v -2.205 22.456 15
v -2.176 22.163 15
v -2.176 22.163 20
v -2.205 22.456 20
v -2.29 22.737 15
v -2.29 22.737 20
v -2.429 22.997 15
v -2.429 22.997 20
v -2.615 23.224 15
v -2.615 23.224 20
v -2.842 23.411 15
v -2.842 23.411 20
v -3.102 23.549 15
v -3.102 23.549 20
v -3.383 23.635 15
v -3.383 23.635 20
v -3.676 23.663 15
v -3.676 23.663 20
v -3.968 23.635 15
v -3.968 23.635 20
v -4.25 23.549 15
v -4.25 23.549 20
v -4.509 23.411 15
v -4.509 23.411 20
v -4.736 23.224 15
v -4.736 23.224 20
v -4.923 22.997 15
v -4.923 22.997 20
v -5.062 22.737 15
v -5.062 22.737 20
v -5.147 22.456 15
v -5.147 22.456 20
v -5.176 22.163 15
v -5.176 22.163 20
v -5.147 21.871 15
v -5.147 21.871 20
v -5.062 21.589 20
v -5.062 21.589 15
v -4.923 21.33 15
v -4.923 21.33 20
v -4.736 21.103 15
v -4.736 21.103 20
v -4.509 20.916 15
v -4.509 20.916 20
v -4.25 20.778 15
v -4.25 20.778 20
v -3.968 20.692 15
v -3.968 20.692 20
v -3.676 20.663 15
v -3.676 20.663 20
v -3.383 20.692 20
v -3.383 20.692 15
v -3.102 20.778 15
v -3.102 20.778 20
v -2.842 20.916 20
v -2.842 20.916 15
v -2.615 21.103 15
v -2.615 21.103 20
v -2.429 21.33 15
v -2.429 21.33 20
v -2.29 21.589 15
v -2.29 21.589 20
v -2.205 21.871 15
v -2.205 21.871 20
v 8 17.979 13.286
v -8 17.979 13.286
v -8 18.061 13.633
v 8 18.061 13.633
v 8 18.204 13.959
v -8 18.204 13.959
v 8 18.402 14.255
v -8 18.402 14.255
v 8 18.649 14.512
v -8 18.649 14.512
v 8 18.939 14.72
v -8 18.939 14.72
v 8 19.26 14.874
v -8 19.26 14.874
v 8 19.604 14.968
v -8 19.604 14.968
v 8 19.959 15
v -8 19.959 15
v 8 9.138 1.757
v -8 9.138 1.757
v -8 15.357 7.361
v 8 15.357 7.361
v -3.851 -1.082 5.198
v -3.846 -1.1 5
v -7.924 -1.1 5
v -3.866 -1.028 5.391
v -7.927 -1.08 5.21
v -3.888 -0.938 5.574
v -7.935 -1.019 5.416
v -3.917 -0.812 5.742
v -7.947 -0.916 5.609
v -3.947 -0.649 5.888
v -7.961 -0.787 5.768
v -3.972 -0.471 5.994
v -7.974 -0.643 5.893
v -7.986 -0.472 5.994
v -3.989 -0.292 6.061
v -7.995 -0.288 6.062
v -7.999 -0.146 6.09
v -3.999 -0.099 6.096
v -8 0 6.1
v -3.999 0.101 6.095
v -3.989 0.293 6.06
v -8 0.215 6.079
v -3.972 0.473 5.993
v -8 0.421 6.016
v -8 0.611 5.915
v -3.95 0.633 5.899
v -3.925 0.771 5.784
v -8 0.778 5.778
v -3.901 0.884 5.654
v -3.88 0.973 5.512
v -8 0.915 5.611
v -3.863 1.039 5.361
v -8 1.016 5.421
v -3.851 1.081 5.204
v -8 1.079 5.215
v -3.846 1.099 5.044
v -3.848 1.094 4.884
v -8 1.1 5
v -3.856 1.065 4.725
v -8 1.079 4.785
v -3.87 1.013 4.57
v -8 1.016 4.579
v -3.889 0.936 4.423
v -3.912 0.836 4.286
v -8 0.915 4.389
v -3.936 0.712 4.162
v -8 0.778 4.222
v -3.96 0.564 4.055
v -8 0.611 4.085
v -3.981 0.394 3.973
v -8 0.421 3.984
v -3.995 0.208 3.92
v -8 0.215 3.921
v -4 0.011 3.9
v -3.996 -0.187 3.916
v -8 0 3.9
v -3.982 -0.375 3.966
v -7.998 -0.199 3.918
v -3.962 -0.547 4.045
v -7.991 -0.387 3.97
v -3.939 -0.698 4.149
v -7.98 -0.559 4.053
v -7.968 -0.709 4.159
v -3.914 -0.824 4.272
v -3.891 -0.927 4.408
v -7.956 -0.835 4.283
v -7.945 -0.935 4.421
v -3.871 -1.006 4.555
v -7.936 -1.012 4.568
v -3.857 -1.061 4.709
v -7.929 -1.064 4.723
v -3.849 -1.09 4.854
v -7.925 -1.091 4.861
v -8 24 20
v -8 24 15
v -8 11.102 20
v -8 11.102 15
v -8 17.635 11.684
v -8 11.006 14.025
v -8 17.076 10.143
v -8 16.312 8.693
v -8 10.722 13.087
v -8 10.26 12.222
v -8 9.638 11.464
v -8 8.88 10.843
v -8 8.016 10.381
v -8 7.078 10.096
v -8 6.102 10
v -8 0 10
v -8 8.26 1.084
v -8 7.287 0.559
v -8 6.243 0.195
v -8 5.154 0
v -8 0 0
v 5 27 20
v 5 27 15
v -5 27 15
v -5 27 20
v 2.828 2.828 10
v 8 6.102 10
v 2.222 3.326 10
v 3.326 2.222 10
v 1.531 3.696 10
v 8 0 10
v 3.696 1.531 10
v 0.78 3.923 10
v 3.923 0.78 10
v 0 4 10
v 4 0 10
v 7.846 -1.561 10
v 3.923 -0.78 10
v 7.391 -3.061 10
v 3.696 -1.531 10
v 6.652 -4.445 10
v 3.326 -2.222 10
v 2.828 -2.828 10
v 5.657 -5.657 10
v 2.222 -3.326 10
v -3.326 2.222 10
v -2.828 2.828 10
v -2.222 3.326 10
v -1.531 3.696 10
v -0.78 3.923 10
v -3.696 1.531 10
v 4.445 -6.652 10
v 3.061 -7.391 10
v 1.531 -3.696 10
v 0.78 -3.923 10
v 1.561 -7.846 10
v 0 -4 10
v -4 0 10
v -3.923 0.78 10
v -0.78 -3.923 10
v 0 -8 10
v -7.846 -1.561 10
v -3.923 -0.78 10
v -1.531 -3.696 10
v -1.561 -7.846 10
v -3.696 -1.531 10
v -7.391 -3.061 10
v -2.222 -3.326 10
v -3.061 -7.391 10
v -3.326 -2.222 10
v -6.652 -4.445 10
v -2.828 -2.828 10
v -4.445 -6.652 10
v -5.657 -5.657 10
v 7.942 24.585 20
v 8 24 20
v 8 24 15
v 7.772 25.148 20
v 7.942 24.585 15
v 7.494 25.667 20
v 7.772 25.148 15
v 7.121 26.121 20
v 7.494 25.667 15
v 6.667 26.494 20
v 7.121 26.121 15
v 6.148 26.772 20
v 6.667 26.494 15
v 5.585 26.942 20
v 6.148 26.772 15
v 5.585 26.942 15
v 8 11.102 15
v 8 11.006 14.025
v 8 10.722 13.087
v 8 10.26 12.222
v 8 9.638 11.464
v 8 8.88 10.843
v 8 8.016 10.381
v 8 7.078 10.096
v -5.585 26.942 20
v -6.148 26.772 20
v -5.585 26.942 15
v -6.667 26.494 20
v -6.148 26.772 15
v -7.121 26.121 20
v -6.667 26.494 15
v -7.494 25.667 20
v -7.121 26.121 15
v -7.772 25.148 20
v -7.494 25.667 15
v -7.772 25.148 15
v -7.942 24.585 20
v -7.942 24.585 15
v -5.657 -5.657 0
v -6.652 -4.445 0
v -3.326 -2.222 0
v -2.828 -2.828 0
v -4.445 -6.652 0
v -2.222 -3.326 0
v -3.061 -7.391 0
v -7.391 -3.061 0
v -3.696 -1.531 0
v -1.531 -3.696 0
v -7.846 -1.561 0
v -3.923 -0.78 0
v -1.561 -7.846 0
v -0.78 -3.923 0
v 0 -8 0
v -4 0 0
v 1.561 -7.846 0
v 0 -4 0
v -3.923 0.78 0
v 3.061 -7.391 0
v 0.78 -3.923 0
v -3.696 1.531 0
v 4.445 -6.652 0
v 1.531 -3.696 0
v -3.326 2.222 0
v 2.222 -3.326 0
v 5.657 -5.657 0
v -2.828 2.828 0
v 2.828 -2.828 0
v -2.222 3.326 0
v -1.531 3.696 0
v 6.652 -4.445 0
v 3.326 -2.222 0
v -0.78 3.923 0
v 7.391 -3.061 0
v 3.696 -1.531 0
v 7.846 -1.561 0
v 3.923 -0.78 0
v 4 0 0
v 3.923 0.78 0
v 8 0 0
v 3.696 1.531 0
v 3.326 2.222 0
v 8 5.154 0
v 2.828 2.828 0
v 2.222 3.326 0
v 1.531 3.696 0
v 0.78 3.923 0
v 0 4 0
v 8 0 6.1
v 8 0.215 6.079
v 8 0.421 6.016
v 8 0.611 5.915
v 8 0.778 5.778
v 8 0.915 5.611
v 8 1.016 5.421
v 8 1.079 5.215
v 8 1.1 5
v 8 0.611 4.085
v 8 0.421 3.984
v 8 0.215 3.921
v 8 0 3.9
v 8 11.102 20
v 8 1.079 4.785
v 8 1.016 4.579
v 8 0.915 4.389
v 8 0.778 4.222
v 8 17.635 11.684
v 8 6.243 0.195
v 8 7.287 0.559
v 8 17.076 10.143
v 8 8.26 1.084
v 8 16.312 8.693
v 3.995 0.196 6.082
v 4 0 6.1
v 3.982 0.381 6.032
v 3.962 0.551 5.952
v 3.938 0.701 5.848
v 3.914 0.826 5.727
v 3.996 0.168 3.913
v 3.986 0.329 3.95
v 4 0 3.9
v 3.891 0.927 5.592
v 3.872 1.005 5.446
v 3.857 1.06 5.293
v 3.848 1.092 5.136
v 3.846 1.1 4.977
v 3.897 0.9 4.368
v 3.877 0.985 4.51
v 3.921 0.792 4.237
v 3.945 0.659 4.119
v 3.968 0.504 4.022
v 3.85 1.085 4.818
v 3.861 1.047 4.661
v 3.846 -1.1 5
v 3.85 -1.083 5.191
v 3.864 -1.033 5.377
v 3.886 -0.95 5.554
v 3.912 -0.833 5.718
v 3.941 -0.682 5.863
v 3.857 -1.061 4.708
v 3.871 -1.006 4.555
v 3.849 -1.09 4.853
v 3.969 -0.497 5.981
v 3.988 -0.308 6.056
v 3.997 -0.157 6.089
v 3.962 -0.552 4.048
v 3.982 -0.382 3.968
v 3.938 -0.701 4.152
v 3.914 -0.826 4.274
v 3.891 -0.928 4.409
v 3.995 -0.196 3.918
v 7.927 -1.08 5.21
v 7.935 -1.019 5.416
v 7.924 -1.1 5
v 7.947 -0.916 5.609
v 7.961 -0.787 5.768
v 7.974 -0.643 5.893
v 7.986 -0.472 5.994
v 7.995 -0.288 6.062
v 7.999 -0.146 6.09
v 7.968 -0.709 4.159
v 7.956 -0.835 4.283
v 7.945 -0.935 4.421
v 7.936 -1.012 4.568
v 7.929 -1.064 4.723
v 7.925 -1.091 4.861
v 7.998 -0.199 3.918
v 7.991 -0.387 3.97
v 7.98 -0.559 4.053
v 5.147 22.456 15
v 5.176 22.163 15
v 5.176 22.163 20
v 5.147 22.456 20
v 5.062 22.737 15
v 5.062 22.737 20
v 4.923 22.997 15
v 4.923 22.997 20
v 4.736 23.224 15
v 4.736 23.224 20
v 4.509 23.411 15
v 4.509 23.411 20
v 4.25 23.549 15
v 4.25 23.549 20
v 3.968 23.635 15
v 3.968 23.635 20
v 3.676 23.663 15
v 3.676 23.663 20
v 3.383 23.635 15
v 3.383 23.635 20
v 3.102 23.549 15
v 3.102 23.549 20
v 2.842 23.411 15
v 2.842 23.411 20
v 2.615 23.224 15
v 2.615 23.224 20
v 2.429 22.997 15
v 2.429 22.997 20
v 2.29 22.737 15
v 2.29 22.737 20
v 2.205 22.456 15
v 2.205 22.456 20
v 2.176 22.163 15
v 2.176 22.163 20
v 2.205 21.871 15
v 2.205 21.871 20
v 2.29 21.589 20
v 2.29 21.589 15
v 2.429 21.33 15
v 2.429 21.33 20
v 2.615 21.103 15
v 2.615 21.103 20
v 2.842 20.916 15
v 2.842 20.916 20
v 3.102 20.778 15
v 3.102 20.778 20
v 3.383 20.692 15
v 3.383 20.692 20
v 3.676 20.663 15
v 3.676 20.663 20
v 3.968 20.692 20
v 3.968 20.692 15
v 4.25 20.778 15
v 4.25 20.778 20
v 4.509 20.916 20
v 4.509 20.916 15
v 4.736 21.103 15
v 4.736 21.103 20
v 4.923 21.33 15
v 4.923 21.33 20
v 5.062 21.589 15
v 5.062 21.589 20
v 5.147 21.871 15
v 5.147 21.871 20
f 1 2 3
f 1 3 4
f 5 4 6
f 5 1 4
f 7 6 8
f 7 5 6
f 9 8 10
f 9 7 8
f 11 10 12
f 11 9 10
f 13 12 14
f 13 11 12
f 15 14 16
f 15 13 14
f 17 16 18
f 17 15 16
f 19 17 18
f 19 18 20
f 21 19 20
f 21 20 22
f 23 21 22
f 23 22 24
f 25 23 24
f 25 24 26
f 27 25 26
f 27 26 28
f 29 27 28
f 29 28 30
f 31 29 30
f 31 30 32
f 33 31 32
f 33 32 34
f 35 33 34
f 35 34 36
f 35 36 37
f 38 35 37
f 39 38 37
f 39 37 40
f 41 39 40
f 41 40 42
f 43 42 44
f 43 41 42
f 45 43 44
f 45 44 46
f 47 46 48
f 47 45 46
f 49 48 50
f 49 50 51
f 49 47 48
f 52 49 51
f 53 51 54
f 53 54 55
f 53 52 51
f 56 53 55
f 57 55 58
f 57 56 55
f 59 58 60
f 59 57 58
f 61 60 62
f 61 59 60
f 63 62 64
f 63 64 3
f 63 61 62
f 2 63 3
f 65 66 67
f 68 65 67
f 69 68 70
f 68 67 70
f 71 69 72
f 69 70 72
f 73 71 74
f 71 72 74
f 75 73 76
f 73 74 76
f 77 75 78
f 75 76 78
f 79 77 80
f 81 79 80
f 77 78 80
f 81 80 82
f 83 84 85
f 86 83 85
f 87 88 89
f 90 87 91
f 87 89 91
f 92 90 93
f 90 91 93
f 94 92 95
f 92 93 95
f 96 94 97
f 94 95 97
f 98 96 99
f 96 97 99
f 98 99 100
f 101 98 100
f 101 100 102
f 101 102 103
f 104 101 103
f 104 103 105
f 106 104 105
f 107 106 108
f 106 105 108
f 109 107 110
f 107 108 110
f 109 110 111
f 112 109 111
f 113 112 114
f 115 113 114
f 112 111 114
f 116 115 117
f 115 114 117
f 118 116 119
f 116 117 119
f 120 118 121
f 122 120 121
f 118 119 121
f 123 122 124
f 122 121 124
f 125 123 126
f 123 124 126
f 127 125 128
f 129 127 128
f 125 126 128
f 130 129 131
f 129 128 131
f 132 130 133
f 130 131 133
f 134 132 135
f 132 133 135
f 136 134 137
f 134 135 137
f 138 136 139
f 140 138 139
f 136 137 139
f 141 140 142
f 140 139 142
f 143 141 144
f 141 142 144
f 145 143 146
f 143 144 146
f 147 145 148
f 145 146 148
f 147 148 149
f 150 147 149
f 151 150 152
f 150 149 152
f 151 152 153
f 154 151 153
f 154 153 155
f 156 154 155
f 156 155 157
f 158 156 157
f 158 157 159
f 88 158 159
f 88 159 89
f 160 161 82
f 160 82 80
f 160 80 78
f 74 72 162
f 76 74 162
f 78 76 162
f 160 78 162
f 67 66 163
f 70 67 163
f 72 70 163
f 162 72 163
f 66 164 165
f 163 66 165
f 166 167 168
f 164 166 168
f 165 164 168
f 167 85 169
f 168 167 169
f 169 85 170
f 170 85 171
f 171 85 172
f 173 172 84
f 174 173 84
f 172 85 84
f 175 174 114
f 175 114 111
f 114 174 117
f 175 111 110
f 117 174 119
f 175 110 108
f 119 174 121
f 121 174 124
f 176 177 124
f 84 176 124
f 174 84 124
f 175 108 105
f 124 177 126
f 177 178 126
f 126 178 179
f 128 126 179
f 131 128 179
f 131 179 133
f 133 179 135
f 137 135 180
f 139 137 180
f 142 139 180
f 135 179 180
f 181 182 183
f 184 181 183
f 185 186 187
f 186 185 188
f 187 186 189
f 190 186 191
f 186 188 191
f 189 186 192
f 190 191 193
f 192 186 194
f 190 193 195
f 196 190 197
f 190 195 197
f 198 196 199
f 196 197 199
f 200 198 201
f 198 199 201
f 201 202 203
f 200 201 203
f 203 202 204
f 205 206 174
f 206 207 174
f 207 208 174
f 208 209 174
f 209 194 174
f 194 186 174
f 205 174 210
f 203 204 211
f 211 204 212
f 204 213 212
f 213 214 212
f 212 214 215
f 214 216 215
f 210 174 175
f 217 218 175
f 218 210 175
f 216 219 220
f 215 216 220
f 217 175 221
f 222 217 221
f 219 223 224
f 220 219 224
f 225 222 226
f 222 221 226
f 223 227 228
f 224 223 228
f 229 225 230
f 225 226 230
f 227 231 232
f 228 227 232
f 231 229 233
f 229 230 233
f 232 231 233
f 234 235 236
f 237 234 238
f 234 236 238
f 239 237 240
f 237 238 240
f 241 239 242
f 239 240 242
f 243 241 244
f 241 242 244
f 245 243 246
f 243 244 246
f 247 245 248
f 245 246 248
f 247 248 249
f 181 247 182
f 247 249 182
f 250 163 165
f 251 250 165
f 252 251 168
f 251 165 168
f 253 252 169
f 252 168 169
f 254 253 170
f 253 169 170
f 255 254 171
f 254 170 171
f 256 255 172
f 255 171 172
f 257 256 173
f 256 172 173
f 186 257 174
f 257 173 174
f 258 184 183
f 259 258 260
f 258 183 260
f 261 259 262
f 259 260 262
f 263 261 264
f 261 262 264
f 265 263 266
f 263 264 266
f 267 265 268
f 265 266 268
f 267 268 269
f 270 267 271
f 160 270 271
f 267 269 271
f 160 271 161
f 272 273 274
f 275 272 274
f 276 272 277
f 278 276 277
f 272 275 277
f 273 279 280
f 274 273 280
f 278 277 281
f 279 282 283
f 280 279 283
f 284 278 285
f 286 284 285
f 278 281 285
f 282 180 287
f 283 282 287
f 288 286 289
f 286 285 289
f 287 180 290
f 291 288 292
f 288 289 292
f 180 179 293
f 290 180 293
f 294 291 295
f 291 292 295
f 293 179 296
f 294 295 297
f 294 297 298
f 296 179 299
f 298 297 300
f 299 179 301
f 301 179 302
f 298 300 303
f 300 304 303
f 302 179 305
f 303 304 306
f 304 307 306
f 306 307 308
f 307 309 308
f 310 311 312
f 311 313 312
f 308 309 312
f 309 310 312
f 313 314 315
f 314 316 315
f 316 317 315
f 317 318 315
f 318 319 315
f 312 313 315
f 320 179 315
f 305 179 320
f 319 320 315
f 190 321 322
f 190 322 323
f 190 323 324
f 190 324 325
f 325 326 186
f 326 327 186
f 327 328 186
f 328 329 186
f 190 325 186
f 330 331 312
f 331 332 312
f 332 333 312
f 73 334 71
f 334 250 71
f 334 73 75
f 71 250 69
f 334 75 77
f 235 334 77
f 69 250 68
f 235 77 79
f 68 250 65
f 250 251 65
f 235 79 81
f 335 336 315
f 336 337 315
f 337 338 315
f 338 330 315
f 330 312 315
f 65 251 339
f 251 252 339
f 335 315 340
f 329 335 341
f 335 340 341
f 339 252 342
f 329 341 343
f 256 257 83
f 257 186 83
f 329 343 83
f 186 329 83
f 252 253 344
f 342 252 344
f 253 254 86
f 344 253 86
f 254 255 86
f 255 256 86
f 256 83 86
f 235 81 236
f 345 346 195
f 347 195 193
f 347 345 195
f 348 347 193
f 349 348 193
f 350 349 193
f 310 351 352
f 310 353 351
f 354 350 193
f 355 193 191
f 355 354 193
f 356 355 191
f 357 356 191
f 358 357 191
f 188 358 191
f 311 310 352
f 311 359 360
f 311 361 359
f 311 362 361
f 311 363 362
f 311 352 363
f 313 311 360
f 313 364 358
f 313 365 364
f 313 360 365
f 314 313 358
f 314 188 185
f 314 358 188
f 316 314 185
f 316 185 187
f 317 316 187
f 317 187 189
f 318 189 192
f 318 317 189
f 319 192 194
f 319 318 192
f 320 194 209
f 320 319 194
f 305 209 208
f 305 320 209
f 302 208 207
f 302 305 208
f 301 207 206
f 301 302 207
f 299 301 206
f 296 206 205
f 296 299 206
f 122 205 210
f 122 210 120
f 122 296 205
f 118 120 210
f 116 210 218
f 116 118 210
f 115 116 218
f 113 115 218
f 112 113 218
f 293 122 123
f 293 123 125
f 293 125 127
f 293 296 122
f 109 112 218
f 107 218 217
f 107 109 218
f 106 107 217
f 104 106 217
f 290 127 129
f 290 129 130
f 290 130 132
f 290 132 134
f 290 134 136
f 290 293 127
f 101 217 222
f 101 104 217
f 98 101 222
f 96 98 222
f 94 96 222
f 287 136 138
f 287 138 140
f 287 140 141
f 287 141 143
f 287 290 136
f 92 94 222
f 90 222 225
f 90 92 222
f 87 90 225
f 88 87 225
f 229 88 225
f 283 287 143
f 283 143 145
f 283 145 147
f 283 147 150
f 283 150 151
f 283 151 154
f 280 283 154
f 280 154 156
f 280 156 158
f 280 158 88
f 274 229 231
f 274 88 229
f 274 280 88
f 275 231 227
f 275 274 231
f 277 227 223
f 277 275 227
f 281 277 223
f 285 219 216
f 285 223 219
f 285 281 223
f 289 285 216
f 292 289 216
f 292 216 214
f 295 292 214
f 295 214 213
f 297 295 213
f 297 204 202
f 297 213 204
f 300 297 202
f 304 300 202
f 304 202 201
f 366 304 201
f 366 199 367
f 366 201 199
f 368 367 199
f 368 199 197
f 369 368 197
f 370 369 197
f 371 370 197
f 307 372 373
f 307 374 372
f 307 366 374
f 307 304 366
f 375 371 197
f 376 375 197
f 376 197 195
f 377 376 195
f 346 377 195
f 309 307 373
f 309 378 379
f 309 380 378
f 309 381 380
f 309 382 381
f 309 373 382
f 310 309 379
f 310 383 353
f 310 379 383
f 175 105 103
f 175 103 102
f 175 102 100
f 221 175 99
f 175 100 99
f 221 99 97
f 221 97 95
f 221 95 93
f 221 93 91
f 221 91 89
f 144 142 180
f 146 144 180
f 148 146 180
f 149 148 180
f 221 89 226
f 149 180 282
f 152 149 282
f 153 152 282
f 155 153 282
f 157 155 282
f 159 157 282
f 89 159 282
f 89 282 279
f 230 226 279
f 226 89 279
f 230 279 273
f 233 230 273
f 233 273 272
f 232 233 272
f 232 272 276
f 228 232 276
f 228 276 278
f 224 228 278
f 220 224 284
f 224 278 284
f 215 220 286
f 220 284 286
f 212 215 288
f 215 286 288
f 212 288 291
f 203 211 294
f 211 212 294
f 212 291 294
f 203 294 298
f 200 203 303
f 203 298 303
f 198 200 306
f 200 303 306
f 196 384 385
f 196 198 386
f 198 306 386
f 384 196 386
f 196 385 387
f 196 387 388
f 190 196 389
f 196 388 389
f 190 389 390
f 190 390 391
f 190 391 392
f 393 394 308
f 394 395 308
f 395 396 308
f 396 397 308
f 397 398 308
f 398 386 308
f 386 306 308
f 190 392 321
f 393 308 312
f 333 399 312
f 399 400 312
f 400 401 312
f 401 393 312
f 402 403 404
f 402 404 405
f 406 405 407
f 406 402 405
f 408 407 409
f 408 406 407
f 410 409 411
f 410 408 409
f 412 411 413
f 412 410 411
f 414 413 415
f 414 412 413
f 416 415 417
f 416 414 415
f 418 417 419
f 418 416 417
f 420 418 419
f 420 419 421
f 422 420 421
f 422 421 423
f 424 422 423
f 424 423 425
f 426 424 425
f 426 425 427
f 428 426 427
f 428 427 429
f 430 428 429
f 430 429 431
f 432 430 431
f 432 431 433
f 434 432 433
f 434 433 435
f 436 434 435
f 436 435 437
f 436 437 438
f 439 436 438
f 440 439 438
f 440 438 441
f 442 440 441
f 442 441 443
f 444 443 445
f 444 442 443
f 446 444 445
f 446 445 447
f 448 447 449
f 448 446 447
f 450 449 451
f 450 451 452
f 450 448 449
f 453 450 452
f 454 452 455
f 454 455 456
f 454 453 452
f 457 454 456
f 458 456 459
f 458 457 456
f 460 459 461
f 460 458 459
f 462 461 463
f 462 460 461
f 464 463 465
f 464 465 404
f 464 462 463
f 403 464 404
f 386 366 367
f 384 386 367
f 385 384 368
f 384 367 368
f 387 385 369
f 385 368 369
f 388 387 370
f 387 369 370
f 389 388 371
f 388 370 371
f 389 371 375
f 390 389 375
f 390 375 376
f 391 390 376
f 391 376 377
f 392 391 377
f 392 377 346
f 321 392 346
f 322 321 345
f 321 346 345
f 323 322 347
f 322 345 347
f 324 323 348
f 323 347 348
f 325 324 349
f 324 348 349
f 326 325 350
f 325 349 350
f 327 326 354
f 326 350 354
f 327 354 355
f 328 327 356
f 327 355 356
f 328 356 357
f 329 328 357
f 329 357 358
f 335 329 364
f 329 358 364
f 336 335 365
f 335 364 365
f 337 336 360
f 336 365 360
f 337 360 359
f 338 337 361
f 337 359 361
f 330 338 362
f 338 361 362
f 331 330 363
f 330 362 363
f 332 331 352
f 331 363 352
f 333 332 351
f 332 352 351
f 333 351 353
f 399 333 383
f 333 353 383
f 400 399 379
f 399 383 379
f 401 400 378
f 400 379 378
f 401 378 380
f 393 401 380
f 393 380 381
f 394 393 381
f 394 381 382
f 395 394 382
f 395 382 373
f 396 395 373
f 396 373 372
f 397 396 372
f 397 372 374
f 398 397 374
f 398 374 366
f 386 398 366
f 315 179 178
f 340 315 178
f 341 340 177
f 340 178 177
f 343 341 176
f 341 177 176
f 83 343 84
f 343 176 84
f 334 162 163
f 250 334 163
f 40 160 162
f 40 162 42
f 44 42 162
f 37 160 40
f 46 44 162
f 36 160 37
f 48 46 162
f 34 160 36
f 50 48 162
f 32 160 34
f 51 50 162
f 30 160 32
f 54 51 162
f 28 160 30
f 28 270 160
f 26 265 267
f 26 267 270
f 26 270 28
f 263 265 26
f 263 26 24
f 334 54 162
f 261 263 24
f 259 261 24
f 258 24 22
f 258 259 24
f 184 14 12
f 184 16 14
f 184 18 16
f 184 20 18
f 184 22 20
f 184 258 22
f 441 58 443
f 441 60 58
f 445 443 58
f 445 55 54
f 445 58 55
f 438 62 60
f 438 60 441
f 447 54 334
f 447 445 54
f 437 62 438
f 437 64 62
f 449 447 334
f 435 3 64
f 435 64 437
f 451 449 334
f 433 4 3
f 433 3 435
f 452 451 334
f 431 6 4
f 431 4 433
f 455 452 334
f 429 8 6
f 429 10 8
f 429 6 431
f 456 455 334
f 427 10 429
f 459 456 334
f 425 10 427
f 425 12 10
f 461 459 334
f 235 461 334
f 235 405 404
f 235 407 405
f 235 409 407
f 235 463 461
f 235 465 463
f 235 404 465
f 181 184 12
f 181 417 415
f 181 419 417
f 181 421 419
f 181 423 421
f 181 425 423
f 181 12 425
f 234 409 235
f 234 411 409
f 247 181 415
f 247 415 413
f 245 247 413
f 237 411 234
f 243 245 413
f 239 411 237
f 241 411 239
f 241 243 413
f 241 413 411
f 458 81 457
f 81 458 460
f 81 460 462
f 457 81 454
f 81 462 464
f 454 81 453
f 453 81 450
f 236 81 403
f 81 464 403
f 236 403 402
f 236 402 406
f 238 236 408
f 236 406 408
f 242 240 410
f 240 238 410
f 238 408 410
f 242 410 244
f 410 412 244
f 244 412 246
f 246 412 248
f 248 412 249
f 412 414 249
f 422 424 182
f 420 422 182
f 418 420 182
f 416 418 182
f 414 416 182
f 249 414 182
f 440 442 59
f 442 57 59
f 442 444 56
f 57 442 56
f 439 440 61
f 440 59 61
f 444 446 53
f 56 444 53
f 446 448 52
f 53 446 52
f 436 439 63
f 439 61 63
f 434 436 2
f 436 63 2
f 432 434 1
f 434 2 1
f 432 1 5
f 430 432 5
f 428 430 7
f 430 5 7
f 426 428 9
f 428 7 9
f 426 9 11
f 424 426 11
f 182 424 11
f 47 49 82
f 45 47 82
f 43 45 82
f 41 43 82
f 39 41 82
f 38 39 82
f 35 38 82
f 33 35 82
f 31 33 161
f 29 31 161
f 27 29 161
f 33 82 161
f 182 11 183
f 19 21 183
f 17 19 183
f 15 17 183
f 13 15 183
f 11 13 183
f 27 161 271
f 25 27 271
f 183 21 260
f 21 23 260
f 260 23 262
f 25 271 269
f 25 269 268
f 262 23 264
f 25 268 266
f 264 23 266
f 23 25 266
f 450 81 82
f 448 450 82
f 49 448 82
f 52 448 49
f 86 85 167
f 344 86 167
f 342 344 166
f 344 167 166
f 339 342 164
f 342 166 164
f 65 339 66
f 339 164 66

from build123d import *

# Parameters (mm, degrees)
F0_R     = 4
F0_R_2   = 1.5
F1_DEPTH = 20
F3_R     = 1.1
F4_DEPTH = 16.001


with BuildPart() as f1:
    # F0 (on Top) → F1 (new body)
    with BuildSketch(Plane.XY):
        with BuildLine():
            ThreePointArc((-8, 0), (0, -8), (8, 0))
            Line((8, 0), (8, 24))
            ThreePointArc((8, 24), (7.12132, 26.12132), (5, 27))
            Line((5, 27), (-5, 27))
            ThreePointArc((-5, 27), (-7.12132, 26.12132), (-8, 24))
            Line((-8, 24), (-8, 0))
        make_face()
        Circle(F0_R, mode=Mode.SUBTRACT)
        with Locations((-3.675823, 22.163428)):
            Circle(F0_R_2, mode=Mode.SUBTRACT)
        with Locations((3.675823, 22.163428)):
            Circle(F0_R_2, mode=Mode.SUBTRACT)
    extrude(amount=F1_DEPTH)

    # F3 (on face) → F4 (cut, through all)
    with BuildSketch(Plane(origin=(-8, 0, 0), x_dir=(0, -1, 0), z_dir=(-1, 0, 0))):
        with BuildLine():
            Line((15.480949, 34.118096), (-11.102321, 34.118096))
            Line((-11.102321, 34.118096), (-11.102321, 15))
            ThreePointArc((-11.102321, 15), (-9.637855, 11.464466), (-6.102321, 10))
            Line((-6.102321, 10), (15.473341, 10))
            Line((15.473341, 10), (15.480949, 34.118096))
        make_face()
        with BuildLine():
            Line((-19.958727, 15), (-48.31529, 15))
            Line((-48.31529, 15), (-48.31529, 0))
            Line((-48.31529, 0), (-48.31529, -8.176547))
            Line((-48.31529, -8.176547), (-5.153973, -8.176547))
            Line((-5.153973, -8.176547), (-5.153973, 0))
            ThreePointArc((-5.153973, 0), (-7.286992, 0.559089), (-9.138177, 1.757198))
            Line((-9.138177, 1.757198), (-15.357077, 7.361316))
            ThreePointArc((-15.357077, 7.361316), (-17.07554, 10.143206), (-17.97924, 13.285714))
            ThreePointArc((-17.97924, 13.285714), (-18.64942, 14.511858), (-19.958727, 15))
        make_face()
        with Locations((0, 5)):
            Circle(F3_R)
    extrude(amount=-F4_DEPTH, mode=Mode.SUBTRACT)


solid = f1.part
